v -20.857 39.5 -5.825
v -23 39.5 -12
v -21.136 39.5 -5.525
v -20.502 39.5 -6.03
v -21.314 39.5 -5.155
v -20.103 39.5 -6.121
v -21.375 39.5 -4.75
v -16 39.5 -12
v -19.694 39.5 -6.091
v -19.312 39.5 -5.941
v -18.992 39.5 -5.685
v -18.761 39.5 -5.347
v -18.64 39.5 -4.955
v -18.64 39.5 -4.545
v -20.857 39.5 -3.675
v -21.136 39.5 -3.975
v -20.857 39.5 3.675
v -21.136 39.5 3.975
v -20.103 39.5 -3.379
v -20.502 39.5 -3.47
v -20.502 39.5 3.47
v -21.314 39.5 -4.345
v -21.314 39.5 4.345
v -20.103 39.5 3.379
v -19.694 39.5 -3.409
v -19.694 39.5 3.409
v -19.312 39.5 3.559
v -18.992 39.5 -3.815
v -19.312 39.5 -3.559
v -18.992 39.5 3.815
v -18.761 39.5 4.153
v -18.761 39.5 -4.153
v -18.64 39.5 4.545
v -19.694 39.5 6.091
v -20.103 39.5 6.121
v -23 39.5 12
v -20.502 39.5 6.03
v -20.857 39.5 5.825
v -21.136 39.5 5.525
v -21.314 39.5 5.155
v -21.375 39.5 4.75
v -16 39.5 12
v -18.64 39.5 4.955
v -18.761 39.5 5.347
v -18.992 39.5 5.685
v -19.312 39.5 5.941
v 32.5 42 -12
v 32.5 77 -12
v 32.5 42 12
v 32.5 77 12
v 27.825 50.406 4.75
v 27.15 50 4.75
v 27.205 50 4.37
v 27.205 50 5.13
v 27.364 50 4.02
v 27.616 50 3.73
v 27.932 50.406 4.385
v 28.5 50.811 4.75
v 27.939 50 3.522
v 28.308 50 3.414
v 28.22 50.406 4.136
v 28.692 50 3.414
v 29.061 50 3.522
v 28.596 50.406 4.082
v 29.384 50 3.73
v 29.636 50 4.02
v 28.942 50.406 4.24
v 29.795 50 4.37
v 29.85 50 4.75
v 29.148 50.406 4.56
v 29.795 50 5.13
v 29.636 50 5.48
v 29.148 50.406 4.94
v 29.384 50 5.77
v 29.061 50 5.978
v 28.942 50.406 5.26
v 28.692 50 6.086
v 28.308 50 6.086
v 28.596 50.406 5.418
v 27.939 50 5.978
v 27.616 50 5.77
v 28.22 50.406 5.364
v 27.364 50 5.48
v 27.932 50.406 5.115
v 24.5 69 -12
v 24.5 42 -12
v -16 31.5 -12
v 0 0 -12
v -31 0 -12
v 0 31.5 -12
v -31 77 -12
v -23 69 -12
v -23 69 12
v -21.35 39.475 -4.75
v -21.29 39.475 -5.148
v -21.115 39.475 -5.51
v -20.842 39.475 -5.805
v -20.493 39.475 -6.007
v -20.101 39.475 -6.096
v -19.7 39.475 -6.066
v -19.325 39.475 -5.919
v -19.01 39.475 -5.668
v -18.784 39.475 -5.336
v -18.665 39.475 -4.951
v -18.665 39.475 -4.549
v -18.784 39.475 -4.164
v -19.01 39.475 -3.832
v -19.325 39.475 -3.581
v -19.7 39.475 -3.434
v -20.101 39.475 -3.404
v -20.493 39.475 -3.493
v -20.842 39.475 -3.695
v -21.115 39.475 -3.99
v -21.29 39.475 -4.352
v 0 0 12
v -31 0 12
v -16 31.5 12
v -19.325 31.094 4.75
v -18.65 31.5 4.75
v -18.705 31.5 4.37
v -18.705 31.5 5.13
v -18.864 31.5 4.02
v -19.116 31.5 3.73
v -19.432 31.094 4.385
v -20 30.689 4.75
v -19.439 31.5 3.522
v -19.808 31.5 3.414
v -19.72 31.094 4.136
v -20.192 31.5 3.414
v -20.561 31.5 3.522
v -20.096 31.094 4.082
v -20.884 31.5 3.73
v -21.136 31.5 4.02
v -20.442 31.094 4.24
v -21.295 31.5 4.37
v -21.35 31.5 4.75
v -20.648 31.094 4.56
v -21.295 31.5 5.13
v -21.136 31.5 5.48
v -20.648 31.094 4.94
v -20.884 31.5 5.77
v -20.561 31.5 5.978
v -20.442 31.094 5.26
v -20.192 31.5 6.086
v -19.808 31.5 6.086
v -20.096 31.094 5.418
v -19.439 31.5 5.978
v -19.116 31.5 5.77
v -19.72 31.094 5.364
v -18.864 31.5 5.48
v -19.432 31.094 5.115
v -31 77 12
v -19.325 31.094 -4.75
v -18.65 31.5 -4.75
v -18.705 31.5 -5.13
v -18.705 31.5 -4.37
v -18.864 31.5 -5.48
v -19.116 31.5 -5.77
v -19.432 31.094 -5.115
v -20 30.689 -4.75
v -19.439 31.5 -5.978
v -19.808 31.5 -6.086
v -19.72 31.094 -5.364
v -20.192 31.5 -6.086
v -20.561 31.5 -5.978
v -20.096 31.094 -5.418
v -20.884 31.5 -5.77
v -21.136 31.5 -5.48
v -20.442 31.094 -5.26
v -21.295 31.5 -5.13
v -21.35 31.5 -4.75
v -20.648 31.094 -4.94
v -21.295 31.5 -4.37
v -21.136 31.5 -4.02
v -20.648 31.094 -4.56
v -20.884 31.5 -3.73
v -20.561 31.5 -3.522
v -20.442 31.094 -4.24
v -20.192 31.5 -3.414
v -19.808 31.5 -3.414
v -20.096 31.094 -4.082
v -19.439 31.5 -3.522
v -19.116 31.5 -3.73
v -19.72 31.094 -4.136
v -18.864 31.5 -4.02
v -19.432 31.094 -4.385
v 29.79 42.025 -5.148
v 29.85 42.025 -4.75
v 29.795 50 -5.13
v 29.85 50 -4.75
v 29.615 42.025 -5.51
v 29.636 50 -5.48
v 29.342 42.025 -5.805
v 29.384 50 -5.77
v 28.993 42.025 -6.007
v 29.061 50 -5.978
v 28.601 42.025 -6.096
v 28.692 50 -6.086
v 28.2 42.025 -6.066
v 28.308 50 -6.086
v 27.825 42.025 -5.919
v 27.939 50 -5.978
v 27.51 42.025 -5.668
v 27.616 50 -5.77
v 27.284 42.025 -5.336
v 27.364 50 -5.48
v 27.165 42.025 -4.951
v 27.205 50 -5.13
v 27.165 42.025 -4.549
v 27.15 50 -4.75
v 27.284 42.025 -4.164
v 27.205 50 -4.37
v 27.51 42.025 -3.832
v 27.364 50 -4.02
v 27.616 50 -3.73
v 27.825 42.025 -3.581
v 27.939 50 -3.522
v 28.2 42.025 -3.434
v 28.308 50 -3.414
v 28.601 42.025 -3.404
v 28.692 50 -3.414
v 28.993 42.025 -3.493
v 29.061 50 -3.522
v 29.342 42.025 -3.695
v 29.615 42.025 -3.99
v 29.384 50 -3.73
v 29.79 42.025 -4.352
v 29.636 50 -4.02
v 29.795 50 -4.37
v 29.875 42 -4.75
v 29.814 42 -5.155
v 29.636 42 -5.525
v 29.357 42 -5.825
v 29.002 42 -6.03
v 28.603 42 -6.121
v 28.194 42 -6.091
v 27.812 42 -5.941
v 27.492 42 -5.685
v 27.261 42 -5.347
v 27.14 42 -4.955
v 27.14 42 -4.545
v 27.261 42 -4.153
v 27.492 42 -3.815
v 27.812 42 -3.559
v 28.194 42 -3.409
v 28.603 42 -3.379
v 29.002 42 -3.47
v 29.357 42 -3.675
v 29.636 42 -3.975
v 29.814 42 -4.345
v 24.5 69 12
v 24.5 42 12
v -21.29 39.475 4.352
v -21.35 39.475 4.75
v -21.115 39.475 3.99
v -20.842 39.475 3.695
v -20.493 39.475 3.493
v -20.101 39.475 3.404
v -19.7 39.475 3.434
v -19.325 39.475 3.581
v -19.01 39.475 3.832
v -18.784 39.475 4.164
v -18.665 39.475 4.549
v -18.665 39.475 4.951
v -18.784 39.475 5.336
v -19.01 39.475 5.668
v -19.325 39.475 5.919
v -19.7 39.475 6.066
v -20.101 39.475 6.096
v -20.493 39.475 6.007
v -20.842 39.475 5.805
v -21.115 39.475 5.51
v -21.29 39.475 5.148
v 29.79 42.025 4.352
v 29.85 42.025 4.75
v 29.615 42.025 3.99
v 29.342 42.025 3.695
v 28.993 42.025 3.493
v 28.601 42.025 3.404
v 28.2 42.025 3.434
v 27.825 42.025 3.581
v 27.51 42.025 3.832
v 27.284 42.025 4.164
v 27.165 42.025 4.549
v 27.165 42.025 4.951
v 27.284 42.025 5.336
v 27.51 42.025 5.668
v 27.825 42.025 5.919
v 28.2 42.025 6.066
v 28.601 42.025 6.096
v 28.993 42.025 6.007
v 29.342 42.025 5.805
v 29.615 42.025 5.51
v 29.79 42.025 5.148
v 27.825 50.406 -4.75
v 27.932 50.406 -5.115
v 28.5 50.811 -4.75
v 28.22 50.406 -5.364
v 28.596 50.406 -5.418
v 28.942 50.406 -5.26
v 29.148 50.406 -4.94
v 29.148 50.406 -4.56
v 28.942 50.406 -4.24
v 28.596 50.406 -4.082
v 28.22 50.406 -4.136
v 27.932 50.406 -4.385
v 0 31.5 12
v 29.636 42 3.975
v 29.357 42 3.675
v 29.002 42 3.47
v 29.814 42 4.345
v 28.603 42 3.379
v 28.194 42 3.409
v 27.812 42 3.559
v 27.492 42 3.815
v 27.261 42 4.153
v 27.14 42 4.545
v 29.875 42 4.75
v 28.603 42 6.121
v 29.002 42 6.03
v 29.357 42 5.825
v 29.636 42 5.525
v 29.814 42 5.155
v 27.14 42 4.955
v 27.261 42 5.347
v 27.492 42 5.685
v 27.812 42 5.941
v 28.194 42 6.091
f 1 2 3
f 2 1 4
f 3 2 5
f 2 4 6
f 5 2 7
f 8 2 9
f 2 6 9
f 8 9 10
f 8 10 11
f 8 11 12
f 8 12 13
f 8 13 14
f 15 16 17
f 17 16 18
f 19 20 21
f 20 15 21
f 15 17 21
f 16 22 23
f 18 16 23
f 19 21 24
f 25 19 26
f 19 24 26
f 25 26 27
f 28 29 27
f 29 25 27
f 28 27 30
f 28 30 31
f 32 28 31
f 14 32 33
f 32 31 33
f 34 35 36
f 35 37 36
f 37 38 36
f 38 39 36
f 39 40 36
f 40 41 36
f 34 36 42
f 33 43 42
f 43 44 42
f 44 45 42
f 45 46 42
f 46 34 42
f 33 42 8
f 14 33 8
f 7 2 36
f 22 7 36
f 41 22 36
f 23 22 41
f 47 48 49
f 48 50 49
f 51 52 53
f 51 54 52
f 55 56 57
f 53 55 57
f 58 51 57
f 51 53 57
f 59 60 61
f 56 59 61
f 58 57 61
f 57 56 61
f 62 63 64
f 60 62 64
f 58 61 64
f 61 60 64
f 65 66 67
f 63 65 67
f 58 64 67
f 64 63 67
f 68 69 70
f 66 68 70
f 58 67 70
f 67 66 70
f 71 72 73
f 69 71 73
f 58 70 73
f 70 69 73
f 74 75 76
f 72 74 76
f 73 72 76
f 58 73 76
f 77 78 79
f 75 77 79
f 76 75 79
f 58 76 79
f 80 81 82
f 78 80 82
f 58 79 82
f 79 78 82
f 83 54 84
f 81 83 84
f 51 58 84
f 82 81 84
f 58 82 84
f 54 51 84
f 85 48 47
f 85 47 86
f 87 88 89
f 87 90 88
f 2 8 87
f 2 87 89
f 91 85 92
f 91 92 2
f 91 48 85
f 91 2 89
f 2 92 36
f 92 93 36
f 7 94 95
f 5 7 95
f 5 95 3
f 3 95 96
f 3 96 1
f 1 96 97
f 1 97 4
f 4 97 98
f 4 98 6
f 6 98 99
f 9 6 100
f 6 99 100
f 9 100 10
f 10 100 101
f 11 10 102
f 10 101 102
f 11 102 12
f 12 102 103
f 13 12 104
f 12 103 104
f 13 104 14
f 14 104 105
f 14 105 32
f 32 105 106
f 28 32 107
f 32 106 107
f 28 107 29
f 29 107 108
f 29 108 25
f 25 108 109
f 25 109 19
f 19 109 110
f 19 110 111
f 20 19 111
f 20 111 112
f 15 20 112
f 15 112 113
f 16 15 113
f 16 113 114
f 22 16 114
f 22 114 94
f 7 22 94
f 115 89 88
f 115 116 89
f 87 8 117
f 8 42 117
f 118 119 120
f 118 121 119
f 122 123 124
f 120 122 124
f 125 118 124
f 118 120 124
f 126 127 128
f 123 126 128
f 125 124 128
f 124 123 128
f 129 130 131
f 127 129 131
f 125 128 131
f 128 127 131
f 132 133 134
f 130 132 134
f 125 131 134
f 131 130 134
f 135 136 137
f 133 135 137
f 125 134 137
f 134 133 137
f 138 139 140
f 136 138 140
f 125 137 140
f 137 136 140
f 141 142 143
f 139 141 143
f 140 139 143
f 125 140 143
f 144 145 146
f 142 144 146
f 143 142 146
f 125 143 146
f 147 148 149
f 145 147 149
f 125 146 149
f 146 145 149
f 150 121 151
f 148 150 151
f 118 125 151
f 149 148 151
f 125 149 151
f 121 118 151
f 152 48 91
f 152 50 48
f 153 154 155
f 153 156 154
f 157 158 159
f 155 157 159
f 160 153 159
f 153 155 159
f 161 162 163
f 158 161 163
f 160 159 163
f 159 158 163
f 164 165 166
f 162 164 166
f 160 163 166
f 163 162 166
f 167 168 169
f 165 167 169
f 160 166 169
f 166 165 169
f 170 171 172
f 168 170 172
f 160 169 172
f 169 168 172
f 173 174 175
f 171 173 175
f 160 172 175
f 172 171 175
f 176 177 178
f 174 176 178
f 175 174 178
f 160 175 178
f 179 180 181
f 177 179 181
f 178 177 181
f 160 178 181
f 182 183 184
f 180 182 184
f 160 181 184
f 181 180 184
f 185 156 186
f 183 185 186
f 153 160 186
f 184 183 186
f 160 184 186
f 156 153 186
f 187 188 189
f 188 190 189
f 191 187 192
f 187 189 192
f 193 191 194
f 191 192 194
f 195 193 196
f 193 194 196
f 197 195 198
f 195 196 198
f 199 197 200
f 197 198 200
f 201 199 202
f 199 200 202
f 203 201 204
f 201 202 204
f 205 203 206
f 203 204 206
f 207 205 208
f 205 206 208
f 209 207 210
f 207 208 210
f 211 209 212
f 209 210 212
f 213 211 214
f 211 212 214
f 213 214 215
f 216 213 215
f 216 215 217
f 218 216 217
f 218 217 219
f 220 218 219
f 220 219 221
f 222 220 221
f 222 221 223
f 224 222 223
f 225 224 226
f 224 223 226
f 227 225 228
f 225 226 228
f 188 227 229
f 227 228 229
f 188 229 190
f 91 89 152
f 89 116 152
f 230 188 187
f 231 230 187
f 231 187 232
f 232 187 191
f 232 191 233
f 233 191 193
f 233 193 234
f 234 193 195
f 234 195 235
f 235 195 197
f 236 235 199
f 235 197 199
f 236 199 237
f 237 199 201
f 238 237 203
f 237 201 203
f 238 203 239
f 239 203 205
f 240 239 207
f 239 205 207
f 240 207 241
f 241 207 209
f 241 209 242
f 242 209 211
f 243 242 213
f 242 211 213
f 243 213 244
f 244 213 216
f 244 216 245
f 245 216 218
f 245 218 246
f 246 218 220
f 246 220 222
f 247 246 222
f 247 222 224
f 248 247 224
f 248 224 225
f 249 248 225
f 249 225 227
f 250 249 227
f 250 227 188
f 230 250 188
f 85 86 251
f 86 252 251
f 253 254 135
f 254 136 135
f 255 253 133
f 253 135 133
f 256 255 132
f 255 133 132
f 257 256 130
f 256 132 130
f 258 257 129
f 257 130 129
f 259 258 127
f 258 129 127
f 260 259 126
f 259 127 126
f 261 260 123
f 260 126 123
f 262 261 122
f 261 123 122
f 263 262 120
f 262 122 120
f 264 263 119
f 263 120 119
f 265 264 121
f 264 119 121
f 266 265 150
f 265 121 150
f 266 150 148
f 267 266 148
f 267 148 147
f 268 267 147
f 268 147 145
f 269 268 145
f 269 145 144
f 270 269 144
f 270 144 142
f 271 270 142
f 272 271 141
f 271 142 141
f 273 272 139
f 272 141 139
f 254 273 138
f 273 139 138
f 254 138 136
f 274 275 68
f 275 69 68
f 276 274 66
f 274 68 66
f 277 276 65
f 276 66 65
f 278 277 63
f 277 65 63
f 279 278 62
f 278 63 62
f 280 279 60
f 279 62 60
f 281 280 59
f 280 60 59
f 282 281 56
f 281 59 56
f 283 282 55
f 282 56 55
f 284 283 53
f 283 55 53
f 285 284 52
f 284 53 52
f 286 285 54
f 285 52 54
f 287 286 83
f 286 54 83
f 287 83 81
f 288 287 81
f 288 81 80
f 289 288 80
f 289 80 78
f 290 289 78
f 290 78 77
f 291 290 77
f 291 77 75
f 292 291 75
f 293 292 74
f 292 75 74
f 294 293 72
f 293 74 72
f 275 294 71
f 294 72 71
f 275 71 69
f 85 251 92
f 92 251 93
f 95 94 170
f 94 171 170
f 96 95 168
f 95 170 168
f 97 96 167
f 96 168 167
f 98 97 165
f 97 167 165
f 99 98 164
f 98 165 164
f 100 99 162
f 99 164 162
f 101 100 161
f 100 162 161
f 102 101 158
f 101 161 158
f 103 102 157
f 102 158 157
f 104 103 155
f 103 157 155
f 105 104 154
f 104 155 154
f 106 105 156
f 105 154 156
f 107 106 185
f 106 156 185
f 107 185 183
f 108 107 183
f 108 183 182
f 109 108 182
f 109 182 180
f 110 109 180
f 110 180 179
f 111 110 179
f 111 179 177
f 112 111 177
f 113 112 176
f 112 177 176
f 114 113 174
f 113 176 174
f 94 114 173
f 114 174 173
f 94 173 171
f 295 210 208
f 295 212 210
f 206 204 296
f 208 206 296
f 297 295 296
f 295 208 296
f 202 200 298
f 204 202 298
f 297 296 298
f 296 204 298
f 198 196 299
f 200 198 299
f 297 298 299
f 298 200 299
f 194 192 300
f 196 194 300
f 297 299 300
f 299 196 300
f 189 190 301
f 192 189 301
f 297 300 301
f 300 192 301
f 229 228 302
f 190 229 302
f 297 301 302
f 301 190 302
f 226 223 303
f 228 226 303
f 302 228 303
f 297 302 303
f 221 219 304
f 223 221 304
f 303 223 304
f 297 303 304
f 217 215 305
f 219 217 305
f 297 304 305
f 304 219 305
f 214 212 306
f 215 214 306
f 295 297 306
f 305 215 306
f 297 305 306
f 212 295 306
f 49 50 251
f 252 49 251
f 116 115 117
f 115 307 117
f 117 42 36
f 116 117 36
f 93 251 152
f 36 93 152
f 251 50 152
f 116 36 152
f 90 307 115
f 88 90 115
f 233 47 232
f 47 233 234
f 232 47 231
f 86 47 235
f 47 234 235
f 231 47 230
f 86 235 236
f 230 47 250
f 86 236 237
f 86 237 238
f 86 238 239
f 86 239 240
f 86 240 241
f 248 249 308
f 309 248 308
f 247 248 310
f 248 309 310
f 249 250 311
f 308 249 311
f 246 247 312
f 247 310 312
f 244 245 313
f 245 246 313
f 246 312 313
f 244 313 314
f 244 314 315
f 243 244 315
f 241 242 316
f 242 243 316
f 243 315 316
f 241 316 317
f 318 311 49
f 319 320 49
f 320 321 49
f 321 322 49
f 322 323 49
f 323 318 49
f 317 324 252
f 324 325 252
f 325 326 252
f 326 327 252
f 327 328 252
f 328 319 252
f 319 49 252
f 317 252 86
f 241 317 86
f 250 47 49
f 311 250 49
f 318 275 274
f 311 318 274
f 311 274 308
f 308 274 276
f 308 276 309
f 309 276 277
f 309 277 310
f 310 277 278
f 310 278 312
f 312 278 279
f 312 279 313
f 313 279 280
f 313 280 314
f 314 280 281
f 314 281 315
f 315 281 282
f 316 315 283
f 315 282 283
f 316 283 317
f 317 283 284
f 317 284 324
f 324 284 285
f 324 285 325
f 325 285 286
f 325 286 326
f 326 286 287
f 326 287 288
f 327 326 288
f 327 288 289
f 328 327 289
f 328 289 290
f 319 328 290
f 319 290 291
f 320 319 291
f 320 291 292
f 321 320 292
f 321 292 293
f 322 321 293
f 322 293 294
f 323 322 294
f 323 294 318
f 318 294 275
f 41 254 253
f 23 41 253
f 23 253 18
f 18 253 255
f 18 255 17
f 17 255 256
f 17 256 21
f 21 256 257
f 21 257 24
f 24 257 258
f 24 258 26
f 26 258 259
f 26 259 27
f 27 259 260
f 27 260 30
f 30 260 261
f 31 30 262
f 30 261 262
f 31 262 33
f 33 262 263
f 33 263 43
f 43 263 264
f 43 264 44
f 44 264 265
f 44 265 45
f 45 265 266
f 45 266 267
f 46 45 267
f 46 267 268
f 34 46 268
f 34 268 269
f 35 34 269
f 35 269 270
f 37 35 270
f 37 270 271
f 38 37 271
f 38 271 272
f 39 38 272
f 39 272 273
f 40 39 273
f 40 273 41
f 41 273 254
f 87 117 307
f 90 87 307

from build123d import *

# Parameters (mm, degrees)
BOSS_EXTRUDE1_DEPTH                  = 12
F_2_7_2_7_DIAMETER_HOLE1_D           = 2.7
F_2_7_2_7_DIAMETER_HOLE1_DEPTH       = 8
F_2_7_2_7_DIAMETER_HOLE1_CSINK_D     = 2.75
F_2_7_2_7_DIAMETER_HOLE1_CSINK_ANGLE = 90
F_2_7_2_7_DIAMETER_HOLE1_TIP         = 0.811161836
F_2_7_2_7_DIAMETER_HOLE2_D           = 2.7
F_2_7_2_7_DIAMETER_HOLE2_DEPTH       = 8
F_2_7_2_7_DIAMETER_HOLE2_CSINK_D     = 2.75
F_2_7_2_7_DIAMETER_HOLE2_CSINK_ANGLE = 90
F_2_7_2_7_DIAMETER_HOLE2_TIP         = 0.811161836


with BuildPart() as part:
    # Sketch1 → Boss-Extrude1 (new, symmetric)
    with BuildSketch(Plane.XY):
        Polygon((0, 0), (-23, 0), (-31, 0), (-31, 77), (-23.404895261, 77), (32.5, 77), (32.5, 42), (24.5, 42), (24.5, 69), (-23, 69), (-23, 39.5), (-16, 39.5), (-16, 31.5), (0, 31.5), align=None)
    extrude(amount=BOSS_EXTRUDE1_DEPTH, both=True)

    # Ø2.7 (2.7) Diameter Hole1
    with Locations(Plane(origin=(0, 39.5, 0), x_dir=(1, 0, 0), z_dir=(0, 1, 0))):
        with Locations((-20, 4.75), (-20, -4.75)):
            CounterSinkHole(F_2_7_2_7_DIAMETER_HOLE1_D / 2, F_2_7_2_7_DIAMETER_HOLE1_CSINK_D / 2, depth=F_2_7_2_7_DIAMETER_HOLE1_DEPTH, counter_sink_angle=F_2_7_2_7_DIAMETER_HOLE1_CSINK_ANGLE)
            with Locations((0, 0, -(F_2_7_2_7_DIAMETER_HOLE1_DEPTH + F_2_7_2_7_DIAMETER_HOLE1_TIP / 2))):  # 118° drill point
                Cone(0, F_2_7_2_7_DIAMETER_HOLE1_D / 2, F_2_7_2_7_DIAMETER_HOLE1_TIP, mode=Mode.SUBTRACT)

    # Ø2.7 (2.7) Diameter Hole2
    with Locations(Plane(origin=(0, 42, 0), x_dir=(-1, 0, 0), z_dir=(0, -1, 0))):
        with Locations((-28.5, 4.75), (-28.5, -4.75)):
            CounterSinkHole(F_2_7_2_7_DIAMETER_HOLE2_D / 2, F_2_7_2_7_DIAMETER_HOLE2_CSINK_D / 2, depth=F_2_7_2_7_DIAMETER_HOLE2_DEPTH, counter_sink_angle=F_2_7_2_7_DIAMETER_HOLE2_CSINK_ANGLE)
            with Locations((0, 0, -(F_2_7_2_7_DIAMETER_HOLE2_DEPTH + F_2_7_2_7_DIAMETER_HOLE2_TIP / 2))):  # 118° drill point
                Cone(0, F_2_7_2_7_DIAMETER_HOLE2_D / 2, F_2_7_2_7_DIAMETER_HOLE2_TIP, mode=Mode.SUBTRACT)


solid = part.part
